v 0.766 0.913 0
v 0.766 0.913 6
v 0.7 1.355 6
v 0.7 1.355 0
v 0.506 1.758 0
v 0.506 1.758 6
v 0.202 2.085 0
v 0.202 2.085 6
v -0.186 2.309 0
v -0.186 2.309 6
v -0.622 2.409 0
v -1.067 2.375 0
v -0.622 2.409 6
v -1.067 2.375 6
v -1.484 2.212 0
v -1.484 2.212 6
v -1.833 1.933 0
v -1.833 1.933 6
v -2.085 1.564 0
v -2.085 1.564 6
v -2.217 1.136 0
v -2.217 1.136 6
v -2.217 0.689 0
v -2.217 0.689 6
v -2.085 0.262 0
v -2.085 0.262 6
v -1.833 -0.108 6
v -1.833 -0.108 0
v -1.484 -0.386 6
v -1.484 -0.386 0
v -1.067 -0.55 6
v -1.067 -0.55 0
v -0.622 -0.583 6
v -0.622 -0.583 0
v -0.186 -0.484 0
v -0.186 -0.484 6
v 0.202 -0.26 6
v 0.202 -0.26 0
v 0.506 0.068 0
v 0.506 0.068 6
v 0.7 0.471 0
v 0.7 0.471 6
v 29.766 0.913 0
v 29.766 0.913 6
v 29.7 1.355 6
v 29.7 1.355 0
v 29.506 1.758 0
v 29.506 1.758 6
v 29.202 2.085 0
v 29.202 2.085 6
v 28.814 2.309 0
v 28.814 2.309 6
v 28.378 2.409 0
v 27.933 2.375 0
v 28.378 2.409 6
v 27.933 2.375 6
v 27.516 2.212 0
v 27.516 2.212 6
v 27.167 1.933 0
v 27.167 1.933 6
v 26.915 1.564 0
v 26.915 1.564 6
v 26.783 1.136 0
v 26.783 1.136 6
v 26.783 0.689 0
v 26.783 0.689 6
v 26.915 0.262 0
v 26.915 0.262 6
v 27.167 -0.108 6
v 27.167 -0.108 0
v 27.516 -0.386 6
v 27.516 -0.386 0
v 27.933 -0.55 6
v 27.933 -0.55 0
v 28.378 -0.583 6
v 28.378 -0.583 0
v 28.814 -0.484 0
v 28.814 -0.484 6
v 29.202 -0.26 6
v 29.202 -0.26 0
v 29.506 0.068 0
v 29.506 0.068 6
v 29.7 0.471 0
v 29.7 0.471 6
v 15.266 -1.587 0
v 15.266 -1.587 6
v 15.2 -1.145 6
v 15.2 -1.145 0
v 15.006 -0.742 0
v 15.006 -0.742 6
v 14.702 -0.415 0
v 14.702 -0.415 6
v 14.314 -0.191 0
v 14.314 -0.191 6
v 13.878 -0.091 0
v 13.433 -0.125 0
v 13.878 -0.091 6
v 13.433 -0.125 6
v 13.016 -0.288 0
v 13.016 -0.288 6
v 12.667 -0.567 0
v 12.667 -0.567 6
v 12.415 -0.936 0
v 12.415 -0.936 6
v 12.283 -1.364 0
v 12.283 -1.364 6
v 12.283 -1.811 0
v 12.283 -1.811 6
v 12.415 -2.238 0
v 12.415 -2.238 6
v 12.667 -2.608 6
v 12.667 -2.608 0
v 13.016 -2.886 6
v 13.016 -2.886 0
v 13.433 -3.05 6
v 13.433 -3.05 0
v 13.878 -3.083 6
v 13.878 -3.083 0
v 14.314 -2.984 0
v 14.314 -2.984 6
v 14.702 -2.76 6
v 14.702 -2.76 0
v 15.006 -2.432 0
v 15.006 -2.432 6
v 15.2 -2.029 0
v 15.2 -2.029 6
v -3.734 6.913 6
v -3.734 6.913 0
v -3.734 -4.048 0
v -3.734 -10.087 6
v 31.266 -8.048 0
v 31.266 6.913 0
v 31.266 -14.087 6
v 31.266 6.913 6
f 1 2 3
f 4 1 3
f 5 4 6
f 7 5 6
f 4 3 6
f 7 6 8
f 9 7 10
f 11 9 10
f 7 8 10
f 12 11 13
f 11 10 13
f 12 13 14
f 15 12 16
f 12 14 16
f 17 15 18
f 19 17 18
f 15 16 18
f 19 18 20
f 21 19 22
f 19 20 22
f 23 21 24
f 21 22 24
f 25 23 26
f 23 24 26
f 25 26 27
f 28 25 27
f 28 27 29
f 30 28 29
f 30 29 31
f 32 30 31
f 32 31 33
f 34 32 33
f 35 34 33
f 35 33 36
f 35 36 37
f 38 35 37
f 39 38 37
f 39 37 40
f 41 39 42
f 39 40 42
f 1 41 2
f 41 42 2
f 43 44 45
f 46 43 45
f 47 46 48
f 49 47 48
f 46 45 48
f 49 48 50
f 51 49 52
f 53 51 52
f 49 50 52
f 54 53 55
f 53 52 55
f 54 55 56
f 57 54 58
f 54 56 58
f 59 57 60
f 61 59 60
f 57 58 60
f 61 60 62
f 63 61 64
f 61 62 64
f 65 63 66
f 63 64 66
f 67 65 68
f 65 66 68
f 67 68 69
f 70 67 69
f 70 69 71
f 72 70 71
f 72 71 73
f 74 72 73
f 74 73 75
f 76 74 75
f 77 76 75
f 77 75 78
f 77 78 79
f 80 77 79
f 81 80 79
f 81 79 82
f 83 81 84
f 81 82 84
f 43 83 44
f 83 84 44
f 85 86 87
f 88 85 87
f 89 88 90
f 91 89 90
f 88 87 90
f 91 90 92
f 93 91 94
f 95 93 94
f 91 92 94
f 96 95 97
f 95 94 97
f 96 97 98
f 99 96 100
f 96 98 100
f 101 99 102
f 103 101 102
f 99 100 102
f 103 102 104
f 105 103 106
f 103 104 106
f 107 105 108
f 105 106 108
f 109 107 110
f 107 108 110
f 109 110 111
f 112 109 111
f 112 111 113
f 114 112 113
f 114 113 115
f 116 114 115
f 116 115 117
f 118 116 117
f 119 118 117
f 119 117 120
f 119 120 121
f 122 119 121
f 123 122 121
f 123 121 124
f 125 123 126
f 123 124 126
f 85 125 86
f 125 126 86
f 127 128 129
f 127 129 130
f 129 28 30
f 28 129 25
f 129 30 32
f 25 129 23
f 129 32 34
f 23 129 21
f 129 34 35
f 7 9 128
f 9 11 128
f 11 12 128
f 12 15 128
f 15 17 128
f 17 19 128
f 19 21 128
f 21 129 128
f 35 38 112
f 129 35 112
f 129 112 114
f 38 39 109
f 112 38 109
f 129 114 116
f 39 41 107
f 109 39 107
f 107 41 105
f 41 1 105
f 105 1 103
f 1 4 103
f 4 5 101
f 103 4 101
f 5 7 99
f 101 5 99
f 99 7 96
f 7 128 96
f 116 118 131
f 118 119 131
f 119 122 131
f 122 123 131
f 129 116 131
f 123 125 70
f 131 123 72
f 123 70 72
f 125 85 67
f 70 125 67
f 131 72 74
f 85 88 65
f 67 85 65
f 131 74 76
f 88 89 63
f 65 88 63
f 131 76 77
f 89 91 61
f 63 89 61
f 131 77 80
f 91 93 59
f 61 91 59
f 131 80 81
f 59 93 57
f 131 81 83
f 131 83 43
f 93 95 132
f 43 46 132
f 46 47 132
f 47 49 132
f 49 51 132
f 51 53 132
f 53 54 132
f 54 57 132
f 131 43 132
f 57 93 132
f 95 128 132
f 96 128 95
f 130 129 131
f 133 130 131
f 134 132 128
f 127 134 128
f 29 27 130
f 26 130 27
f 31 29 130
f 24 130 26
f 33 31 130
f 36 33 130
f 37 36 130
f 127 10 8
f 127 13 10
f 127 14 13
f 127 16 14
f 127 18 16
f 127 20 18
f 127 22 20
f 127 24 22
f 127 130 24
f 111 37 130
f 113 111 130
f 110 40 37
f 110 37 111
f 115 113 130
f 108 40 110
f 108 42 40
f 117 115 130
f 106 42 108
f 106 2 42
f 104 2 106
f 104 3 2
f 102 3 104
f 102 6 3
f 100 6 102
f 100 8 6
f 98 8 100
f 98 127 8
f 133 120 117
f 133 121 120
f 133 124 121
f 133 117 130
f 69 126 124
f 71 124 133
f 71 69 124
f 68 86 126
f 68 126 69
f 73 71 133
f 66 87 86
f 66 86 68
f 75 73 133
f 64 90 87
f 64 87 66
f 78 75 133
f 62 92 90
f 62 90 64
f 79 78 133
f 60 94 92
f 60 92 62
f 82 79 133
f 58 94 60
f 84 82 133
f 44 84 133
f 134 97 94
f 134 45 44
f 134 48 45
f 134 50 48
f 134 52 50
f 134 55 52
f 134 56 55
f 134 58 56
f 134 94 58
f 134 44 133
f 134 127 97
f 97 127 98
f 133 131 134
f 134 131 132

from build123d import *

# Parameters (mm, degrees)
F1_DEPTH = 6
F2_SIZE  = 5.99999
F3_R     = 1.5
F4_DEPTH = 6


# Not quite as in the source:
# - a fillet or chamfer is up to 0.001 mm smaller than in the source, because OpenCascade refuses the exact size


with BuildPart() as f1:
    # F0 (on Top) → F1 (new body)
    with BuildSketch(Plane.XY):
        Polygon((31.2662842423, 6.9127185345), (-3.7337157577, 6.9127185345), (-3.7337157577, -10.0872814655), (31.2662842423, -14.0872814655), align=None)
    extrude(amount=F1_DEPTH)

    # F2 (size 6 in the source; OpenCascade refuses exactly that, so slightly less here)
    f2_edges = [f1.edges().sort_by_distance(p)[0] for p in [
        (13.766284, -12.087281, 0),
    ]]
    chamfer(f2_edges, length=F2_SIZE)

    # F3 (on face) → F4 (cut, through all)
    with BuildSketch(Plane.XY.offset(6)):
        with Locations((-0.7337157577, 0.9127185345)):
            Circle(F3_R)
        with Locations((13.7662842423, -1.5872814655)):
            Circle(F3_R)
        with Locations((28.2662842423, 0.9127185345)):
            Circle(F3_R)
    extrude(amount=-F4_DEPTH, mode=Mode.SUBTRACT)


solid = f1.part
